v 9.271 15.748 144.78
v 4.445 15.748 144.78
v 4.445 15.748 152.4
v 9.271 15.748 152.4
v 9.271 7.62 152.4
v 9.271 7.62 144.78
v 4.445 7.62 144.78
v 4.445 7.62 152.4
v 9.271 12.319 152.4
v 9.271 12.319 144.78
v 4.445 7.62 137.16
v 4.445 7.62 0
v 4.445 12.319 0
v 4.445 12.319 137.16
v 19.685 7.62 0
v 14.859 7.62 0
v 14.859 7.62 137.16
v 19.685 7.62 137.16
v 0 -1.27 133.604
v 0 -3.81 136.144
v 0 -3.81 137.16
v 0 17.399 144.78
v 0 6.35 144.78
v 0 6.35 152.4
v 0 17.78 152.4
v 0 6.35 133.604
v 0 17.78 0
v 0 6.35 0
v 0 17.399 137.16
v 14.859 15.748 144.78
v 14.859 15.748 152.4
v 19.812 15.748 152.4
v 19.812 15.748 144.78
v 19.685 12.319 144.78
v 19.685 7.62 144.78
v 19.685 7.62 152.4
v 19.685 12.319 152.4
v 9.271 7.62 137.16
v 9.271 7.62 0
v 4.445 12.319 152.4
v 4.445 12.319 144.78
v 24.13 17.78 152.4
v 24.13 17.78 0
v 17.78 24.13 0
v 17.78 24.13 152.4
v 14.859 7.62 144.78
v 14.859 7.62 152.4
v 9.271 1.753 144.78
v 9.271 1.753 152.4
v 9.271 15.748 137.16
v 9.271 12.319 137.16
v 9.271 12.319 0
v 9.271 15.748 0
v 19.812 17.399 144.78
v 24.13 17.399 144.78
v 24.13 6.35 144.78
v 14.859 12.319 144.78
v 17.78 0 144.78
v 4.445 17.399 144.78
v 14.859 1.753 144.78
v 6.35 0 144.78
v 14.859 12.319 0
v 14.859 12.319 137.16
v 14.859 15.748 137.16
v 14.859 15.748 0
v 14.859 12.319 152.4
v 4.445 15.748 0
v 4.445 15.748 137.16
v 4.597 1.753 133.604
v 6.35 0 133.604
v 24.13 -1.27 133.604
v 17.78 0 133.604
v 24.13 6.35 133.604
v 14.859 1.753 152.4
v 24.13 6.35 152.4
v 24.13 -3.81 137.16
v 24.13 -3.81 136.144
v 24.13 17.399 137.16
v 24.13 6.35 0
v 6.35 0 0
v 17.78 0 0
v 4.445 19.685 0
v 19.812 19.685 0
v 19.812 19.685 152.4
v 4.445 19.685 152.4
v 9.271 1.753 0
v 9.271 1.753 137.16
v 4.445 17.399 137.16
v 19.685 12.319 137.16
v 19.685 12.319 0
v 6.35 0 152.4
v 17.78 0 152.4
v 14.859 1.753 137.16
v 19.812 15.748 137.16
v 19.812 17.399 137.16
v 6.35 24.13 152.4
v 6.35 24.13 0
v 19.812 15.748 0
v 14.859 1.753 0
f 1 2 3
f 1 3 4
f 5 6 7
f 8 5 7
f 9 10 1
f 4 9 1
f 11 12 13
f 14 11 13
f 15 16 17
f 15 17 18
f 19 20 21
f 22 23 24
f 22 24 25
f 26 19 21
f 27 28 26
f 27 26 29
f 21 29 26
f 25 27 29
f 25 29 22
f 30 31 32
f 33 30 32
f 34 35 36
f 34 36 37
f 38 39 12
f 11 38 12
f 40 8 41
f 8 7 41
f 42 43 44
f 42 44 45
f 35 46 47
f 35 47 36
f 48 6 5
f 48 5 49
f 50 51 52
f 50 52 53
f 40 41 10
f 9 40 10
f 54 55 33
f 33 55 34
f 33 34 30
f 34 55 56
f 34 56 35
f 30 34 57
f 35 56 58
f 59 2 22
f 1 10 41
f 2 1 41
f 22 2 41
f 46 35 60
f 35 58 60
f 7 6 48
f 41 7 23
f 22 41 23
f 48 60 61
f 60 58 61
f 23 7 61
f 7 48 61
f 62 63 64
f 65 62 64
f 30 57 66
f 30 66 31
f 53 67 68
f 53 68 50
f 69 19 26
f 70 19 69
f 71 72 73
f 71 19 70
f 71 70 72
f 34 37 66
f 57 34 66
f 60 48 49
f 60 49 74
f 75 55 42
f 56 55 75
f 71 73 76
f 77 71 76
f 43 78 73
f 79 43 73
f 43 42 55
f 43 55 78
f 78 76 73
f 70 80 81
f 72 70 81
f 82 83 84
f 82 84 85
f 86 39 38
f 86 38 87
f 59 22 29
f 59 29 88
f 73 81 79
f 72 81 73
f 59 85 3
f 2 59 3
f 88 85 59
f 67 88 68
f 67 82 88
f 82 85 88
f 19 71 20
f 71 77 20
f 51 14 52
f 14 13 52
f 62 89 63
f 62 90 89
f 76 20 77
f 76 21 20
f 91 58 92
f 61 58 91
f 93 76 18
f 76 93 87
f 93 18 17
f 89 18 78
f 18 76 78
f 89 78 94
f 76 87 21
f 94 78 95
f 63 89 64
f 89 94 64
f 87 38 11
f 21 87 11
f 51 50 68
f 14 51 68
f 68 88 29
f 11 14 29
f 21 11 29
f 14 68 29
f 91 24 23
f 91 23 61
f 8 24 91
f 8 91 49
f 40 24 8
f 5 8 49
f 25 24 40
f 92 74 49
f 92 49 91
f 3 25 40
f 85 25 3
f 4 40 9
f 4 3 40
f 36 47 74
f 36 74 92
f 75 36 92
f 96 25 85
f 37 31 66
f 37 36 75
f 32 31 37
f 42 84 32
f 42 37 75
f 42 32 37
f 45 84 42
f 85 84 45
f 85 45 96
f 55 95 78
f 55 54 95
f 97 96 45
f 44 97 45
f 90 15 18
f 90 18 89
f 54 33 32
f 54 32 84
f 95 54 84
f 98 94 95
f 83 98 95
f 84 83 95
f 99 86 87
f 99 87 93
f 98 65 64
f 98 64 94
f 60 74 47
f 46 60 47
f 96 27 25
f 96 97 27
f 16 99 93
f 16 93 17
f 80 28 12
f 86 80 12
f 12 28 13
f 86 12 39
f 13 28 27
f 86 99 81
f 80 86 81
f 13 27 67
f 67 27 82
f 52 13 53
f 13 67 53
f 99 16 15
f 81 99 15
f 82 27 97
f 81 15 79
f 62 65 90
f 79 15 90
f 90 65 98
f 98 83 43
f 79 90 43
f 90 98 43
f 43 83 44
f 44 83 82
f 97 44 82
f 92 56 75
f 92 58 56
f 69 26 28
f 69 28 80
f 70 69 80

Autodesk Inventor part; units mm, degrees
ref_plane "YZ Plane" through (0, 0, 0) normal (1, 0, 0) x (0, 1, 0)
ref_plane "XZ Plane" through (0, 0, 0) normal (0, 1, 0) x (-1, 0, 0)
ref_plane "XY Plane" through (0, 0, 0) normal (0, 0, 1) x (1, 0, 0)
sketch "Sketch1" plane through (0, 0, 0) normal (0, 0, 1) x (1, 0, 0)
  line L0 (0, 0) -> (0, 24.13)
  line L1 (0, 24.13) -> (24.13, 24.13)
  line L2 (24.13, 24.13) -> (24.13, 0)
  line L3 (24.13, 0) -> (0, 0)
  line L4 (0, 0) -> (0, 1.7526)
  line L5 (9.144, 1.7526) -> (14.986, 1.7526)
  line L6 (9.144, 1.7526) -> (9.271, 1.7526)
  line L7 (9.271, 1.7526) -> (14.859, 1.7526)
  line L8 (0, 0) -> (0, 7.62)
  line L9 (24.13, 0) -> (24.13, 7.62)
  line L10 (14.859, 7.62) -> (19.685, 7.62)
  line L11 (19.685, 7.62) -> (19.685, 12.319)
  line L12 (19.685, 12.319) -> (14.859, 12.319)
  line L13 (9.271, 7.62) -> (4.445, 7.62)
  line L14 (4.445, 7.62) -> (4.445, 12.319)
  line L15 (4.445, 12.319) -> (9.271, 12.319)
  line L16 (9.271, 7.62) -> (9.271, 1.7526)
  line L17 (14.859, 1.7526) -> (14.859, 7.62)
  line L18 (14.859, 12.319) -> (14.859, 15.748)
  line L19 (9.271, 12.319) -> (9.271, 15.748)
  line L20 (19.812, 15.748) -> (19.812, 19.685)
  line L21 (14.859, 15.748) -> (19.812, 15.748)
  line L22 (19.812, 19.685) -> (4.445, 19.685)
  line L23 (4.445, 19.685) -> (4.445, 15.748)
  line L24 (4.445, 15.748) -> (9.271, 15.748)
  dimension "d0" = 24.13
  dimension "d1" = 24.13
  dimension "d2" = 1.7526
  dimension "d3" = 9.144
  dimension "d5" = 0.127
  dimension "d6" = 5.588
  dimension "d7" = 7.62
  dimension "d8" = 7.62
  dimension "d9" = 4.826
  dimension "d10" = 4.699
  dimension "d11" = 4.826
  dimension "d12" = 4.699
  dimension "d13" = 5.8674
  dimension "d14" = 5.8674
  dimension "d15" = 3.429
  dimension "d16" = 3.429
  dimension "d18" = 3.937
sketch "Sketch2" plane through (0, 0, 0) normal (0, 0, 1) x (1, 0, 0)
  point P0 (0, 0)
extrude "Extrusion1" add sketch "Sketch1" along normal blind 152.4
chamfer "Chamfer1" distance 6.35 angle 45 4 edges at (0, 24.13, 76.2) (24.13, 24.13, 76.2) (24.13, 0, 76.2) (0, 0, 76.2)
sketch "Sketch3" plane through (6.35, 0, 0) normal (0, -1, 0) x (1, 0, 0)
  line L0 (17.78, 0) -> (17.78, 152.4) projected
  line L1 (17.78, 152.4) -> (17.78, 144.78)
  line L2 (17.78, 144.78) -> (-6.35, 144.78)
  line L3 (2.921, 0) -> (2.921, 152.4) projected
  line L4 (-6.35, 144.78) -> (-6.35, 137.16)
  line L5 (-6.35, 152.4) -> (-6.35, 0) projected
  line L6 (-6.35, 137.16) -> (17.78, 137.16)
  line L7 (17.78, 137.16) -> (17.78, 144.78)
  dimension "d24" = 7.62
  dimension "d25" = 7.62
extrude "Extrusion2" cut sketch "Sketch3" against normal blind 17.399
sketch "Sketch4" plane through (6.35, 0, 0) normal (0, -1, 0) x (1, 0, 0)
  line L0 (17.78, 144.78) -> (17.78, 137.16) projected
  line L1 (17.78, 137.16) -> (-6.35, 137.16)
  line L2 (-6.35, 137.16) -> (-6.35, 133.604)
  line L3 (-6.35, 133.604) -> (17.78, 133.604)
  line L4 (17.78, 133.604) -> (17.78, 137.16)
  point P0 (-6.35, 0)
  dimension "d28" = 3.556
extrude "Extrusion3" add sketch "Sketch4" against normal blind 1.7526
sketch "Sketch5" plane through (0, 6.35, 137.16) normal (-0.7071, -0.7071, 0) x (-0.7071, 0.7071, 0)
  point P0 (-4.4901, 137.16)
sketch "Sketch6" plane through (6.35, 0, 0) normal (0, -1, 0) x (1, 0, 0)
  point P0 (-6.35, 0)
sketch "Sketch7" plane through (6.35, 0, 0) normal (0, -1, 0) x (1, 0, 0)
  line L0 (17.78, 137.16) -> (13.1826, 137.16) projected
  line L1 (-6.35, 137.16) -> (-6.35, 0) projected
  line L2 (17.78, 137.16) -> (-6.35, 137.16)
  line L3 (-6.35, 137.16) -> (-6.35, 133.604)
  line L4 (-6.35, 133.604) -> (17.78, 133.604)
  line L5 (17.78, 133.604) -> (17.78, 137.16)
  dimension "d31" = 3.556
extrude "Extrusion4" add sketch "Sketch7" along normal blind 3.81
chamfer "Chamfer2" distance 2.54 angle 45 1 edges at (12.065, -3.81, 133.604)
sketch "Sketch8" plane through (24.13, 1.7526, 137.16) normal (1, 0, 0) x (0, 0, -1)
  point P0 (137.16, -1.7526)
sketch "Sketch9" plane through (6.35, 1.7526, 0) normal (0, 1, 0) x (1, 0, 0)
  line L0 (17.78, -137.16) -> (17.78, -133.604) projected
  line L1 (13.1826, -137.16) -> (17.78, -137.16) projected
  line L2 (17.78, -137.16) -> (13.1826, -137.16)
  line L3 (13.1826, -137.16) -> (13.1826, -133.604)
  line L4 (13.1826, -133.604) -> (17.78, -133.604)
  line L5 (17.78, -133.604) -> (17.78, -137.16)
  point P0 (-6.35, 0)
extrude "Extrusion5" add sketch "Sketch9" along normal blind 5.08
sketch "Sketch10" plane through (6.35, 1.7526, 0) normal (0, 1, 0) x (1, 0, 0)
  point P0 (-6.35, 0)
sketch "Sketch11" plane through (0, 1.7526, 133.604) normal (-1, 0, 0) x (0, 0, 1)
  point P0 (-133.604, -1.7526)
sketch "Sketch12" plane through (0, 1.7526, 133.604) normal (-1, 0, 0) x (0, 0, 1)
  point P0 (-133.604, -1.7526)
sketch "Sketch13" plane through (6.35, 1.7526, 0) normal (0, 1, 0) x (1, 0, 0)
  line L0 (-1.7526, -133.604) -> (-1.7526, -137.16) projected
  line L1 (-6.35, -133.604) -> (17.78, -133.604) projected
  line L2 (-1.7526, -137.16) -> (-1.7526, -133.604)
  line L3 (-1.7526, -133.604) -> (-6.35, -133.604)
  line L4 (-6.35, -133.604) -> (-6.35, -137.16)
  line L5 (-6.35, -137.16) -> (-1.7526, -137.16)
  point P0 (-6.35, 0)
extrude "Extrusion6" add sketch "Sketch13" along normal blind 5.08
properties part number "RIPnewslideholder"
